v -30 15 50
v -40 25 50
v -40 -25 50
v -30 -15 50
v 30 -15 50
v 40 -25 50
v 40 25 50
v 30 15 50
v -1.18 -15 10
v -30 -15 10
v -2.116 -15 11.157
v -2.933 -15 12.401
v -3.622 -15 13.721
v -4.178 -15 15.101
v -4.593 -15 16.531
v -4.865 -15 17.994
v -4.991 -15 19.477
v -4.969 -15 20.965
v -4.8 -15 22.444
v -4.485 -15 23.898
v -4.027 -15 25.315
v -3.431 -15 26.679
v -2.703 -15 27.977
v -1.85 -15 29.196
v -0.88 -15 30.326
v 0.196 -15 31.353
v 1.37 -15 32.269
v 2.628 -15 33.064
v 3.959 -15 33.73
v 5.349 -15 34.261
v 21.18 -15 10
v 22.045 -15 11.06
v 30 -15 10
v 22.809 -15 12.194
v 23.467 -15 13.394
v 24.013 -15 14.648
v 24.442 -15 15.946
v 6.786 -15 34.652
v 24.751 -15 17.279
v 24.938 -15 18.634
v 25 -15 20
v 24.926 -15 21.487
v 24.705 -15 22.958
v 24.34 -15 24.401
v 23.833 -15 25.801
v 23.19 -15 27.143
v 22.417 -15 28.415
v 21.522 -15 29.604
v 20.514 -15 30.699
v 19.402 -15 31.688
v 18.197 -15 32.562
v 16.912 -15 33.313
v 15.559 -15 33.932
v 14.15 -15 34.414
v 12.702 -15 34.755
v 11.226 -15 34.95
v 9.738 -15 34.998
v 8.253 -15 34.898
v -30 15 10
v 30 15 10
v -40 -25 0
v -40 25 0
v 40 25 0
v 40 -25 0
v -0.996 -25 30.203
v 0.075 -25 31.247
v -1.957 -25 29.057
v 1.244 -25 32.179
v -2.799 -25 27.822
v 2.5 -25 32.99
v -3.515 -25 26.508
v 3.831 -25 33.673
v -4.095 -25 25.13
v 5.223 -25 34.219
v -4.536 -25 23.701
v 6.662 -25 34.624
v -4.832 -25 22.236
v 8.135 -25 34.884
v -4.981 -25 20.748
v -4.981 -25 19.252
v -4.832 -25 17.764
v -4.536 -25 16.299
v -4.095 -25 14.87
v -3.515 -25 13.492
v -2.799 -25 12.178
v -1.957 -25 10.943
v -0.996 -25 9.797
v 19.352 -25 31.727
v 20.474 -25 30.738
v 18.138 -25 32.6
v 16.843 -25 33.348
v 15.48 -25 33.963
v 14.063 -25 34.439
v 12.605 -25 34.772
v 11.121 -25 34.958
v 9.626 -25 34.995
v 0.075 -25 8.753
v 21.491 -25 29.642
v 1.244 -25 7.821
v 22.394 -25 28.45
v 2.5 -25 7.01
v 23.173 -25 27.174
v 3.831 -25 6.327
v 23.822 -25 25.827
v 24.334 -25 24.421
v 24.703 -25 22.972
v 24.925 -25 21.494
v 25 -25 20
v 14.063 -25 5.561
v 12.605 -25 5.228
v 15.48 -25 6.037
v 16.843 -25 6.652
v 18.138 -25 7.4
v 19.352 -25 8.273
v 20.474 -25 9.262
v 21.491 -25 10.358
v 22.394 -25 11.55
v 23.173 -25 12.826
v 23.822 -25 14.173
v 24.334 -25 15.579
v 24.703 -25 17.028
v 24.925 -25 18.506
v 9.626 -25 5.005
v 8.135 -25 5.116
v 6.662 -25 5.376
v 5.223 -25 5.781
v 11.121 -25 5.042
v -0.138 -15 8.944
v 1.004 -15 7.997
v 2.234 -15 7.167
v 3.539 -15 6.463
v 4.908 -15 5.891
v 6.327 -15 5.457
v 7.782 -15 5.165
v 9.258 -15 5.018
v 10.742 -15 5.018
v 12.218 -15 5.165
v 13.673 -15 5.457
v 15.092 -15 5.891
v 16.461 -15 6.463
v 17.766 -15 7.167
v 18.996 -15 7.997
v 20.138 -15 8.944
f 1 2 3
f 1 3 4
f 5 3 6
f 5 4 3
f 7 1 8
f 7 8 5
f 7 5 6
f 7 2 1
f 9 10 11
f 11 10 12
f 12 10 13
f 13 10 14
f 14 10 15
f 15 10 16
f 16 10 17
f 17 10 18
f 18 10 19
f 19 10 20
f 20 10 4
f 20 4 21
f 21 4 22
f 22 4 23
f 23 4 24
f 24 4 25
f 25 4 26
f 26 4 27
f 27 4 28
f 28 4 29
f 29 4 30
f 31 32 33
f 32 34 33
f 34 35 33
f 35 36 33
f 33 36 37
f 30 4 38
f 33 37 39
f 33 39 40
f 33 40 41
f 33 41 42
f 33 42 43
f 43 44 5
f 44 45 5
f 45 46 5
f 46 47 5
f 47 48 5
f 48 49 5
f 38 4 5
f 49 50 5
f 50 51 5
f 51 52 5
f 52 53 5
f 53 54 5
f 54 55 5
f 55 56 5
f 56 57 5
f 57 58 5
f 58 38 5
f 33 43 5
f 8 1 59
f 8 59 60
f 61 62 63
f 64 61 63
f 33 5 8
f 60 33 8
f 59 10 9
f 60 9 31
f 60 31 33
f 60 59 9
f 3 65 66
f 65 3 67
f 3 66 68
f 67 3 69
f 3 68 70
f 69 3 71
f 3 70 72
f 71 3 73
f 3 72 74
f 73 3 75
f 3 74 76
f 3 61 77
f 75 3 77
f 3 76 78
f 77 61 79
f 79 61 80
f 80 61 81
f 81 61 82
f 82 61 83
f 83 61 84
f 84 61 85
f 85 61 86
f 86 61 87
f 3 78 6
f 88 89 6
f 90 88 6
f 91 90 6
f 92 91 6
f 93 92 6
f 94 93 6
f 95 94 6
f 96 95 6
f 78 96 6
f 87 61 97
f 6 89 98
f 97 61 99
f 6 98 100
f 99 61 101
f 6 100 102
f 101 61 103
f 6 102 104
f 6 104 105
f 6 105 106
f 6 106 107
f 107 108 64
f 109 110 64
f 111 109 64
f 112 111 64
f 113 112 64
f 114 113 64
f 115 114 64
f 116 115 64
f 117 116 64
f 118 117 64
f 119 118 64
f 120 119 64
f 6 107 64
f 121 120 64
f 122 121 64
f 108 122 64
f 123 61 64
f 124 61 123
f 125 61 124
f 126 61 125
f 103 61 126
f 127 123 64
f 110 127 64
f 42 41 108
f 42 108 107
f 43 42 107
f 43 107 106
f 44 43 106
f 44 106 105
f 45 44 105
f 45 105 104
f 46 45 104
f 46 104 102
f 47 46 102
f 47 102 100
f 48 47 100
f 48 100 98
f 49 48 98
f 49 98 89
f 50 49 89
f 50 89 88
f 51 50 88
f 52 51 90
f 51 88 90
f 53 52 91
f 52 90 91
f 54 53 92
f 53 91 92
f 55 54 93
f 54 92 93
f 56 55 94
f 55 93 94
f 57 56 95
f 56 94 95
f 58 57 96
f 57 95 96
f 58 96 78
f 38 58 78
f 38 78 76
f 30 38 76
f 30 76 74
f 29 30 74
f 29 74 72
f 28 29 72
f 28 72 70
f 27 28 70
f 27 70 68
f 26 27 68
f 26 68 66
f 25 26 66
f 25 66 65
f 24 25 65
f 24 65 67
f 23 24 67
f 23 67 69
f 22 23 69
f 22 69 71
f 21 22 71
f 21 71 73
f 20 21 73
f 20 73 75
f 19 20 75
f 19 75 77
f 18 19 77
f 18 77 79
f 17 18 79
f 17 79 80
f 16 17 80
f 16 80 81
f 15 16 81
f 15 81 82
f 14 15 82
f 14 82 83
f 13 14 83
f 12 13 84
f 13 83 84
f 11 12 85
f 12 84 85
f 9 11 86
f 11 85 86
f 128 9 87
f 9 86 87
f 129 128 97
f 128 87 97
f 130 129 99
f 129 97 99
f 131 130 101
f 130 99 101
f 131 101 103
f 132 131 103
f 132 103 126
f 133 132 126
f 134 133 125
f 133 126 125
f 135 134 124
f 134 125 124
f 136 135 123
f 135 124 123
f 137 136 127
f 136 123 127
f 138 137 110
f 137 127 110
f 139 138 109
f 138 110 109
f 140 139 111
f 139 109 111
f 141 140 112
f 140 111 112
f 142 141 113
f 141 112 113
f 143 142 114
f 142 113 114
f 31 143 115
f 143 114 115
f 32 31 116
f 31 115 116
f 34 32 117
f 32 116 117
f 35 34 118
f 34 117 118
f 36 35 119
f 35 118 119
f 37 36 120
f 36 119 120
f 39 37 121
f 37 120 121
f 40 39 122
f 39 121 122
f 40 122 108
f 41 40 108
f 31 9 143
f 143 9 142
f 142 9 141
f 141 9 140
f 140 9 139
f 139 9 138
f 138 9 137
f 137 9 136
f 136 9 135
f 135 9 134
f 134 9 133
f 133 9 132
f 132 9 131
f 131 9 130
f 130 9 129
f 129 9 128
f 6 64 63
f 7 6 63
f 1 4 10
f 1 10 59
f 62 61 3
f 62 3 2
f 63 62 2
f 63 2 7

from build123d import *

# Parameters (mm, degrees)
F0_W     = 80
F0_H     = 50
F1_DEPTH = 50
F2_W     = 60
F2_H     = 30
F3_DEPTH = 40
F4_R     = 15
F5_DEPTH = 10


with BuildPart() as f1:
    # F0 (on Top) → F1 (new body)
    with BuildSketch(Plane.XY):
        Rectangle(F0_W, F0_H)
    extrude(amount=F1_DEPTH)

    # F2 (on face) → F3 (cut)
    with BuildSketch(Plane.XY.offset(50)):
        Rectangle(F2_W, F2_H)
    extrude(amount=-F3_DEPTH, mode=Mode.SUBTRACT)

    # F4 (on face) → F5 (cut, through all)
    with BuildSketch(Plane.XZ.offset(25)):
        with Locations((10, 20)):
            Circle(F4_R)
    extrude(amount=-F5_DEPTH, mode=Mode.SUBTRACT)


solid = f1.part
